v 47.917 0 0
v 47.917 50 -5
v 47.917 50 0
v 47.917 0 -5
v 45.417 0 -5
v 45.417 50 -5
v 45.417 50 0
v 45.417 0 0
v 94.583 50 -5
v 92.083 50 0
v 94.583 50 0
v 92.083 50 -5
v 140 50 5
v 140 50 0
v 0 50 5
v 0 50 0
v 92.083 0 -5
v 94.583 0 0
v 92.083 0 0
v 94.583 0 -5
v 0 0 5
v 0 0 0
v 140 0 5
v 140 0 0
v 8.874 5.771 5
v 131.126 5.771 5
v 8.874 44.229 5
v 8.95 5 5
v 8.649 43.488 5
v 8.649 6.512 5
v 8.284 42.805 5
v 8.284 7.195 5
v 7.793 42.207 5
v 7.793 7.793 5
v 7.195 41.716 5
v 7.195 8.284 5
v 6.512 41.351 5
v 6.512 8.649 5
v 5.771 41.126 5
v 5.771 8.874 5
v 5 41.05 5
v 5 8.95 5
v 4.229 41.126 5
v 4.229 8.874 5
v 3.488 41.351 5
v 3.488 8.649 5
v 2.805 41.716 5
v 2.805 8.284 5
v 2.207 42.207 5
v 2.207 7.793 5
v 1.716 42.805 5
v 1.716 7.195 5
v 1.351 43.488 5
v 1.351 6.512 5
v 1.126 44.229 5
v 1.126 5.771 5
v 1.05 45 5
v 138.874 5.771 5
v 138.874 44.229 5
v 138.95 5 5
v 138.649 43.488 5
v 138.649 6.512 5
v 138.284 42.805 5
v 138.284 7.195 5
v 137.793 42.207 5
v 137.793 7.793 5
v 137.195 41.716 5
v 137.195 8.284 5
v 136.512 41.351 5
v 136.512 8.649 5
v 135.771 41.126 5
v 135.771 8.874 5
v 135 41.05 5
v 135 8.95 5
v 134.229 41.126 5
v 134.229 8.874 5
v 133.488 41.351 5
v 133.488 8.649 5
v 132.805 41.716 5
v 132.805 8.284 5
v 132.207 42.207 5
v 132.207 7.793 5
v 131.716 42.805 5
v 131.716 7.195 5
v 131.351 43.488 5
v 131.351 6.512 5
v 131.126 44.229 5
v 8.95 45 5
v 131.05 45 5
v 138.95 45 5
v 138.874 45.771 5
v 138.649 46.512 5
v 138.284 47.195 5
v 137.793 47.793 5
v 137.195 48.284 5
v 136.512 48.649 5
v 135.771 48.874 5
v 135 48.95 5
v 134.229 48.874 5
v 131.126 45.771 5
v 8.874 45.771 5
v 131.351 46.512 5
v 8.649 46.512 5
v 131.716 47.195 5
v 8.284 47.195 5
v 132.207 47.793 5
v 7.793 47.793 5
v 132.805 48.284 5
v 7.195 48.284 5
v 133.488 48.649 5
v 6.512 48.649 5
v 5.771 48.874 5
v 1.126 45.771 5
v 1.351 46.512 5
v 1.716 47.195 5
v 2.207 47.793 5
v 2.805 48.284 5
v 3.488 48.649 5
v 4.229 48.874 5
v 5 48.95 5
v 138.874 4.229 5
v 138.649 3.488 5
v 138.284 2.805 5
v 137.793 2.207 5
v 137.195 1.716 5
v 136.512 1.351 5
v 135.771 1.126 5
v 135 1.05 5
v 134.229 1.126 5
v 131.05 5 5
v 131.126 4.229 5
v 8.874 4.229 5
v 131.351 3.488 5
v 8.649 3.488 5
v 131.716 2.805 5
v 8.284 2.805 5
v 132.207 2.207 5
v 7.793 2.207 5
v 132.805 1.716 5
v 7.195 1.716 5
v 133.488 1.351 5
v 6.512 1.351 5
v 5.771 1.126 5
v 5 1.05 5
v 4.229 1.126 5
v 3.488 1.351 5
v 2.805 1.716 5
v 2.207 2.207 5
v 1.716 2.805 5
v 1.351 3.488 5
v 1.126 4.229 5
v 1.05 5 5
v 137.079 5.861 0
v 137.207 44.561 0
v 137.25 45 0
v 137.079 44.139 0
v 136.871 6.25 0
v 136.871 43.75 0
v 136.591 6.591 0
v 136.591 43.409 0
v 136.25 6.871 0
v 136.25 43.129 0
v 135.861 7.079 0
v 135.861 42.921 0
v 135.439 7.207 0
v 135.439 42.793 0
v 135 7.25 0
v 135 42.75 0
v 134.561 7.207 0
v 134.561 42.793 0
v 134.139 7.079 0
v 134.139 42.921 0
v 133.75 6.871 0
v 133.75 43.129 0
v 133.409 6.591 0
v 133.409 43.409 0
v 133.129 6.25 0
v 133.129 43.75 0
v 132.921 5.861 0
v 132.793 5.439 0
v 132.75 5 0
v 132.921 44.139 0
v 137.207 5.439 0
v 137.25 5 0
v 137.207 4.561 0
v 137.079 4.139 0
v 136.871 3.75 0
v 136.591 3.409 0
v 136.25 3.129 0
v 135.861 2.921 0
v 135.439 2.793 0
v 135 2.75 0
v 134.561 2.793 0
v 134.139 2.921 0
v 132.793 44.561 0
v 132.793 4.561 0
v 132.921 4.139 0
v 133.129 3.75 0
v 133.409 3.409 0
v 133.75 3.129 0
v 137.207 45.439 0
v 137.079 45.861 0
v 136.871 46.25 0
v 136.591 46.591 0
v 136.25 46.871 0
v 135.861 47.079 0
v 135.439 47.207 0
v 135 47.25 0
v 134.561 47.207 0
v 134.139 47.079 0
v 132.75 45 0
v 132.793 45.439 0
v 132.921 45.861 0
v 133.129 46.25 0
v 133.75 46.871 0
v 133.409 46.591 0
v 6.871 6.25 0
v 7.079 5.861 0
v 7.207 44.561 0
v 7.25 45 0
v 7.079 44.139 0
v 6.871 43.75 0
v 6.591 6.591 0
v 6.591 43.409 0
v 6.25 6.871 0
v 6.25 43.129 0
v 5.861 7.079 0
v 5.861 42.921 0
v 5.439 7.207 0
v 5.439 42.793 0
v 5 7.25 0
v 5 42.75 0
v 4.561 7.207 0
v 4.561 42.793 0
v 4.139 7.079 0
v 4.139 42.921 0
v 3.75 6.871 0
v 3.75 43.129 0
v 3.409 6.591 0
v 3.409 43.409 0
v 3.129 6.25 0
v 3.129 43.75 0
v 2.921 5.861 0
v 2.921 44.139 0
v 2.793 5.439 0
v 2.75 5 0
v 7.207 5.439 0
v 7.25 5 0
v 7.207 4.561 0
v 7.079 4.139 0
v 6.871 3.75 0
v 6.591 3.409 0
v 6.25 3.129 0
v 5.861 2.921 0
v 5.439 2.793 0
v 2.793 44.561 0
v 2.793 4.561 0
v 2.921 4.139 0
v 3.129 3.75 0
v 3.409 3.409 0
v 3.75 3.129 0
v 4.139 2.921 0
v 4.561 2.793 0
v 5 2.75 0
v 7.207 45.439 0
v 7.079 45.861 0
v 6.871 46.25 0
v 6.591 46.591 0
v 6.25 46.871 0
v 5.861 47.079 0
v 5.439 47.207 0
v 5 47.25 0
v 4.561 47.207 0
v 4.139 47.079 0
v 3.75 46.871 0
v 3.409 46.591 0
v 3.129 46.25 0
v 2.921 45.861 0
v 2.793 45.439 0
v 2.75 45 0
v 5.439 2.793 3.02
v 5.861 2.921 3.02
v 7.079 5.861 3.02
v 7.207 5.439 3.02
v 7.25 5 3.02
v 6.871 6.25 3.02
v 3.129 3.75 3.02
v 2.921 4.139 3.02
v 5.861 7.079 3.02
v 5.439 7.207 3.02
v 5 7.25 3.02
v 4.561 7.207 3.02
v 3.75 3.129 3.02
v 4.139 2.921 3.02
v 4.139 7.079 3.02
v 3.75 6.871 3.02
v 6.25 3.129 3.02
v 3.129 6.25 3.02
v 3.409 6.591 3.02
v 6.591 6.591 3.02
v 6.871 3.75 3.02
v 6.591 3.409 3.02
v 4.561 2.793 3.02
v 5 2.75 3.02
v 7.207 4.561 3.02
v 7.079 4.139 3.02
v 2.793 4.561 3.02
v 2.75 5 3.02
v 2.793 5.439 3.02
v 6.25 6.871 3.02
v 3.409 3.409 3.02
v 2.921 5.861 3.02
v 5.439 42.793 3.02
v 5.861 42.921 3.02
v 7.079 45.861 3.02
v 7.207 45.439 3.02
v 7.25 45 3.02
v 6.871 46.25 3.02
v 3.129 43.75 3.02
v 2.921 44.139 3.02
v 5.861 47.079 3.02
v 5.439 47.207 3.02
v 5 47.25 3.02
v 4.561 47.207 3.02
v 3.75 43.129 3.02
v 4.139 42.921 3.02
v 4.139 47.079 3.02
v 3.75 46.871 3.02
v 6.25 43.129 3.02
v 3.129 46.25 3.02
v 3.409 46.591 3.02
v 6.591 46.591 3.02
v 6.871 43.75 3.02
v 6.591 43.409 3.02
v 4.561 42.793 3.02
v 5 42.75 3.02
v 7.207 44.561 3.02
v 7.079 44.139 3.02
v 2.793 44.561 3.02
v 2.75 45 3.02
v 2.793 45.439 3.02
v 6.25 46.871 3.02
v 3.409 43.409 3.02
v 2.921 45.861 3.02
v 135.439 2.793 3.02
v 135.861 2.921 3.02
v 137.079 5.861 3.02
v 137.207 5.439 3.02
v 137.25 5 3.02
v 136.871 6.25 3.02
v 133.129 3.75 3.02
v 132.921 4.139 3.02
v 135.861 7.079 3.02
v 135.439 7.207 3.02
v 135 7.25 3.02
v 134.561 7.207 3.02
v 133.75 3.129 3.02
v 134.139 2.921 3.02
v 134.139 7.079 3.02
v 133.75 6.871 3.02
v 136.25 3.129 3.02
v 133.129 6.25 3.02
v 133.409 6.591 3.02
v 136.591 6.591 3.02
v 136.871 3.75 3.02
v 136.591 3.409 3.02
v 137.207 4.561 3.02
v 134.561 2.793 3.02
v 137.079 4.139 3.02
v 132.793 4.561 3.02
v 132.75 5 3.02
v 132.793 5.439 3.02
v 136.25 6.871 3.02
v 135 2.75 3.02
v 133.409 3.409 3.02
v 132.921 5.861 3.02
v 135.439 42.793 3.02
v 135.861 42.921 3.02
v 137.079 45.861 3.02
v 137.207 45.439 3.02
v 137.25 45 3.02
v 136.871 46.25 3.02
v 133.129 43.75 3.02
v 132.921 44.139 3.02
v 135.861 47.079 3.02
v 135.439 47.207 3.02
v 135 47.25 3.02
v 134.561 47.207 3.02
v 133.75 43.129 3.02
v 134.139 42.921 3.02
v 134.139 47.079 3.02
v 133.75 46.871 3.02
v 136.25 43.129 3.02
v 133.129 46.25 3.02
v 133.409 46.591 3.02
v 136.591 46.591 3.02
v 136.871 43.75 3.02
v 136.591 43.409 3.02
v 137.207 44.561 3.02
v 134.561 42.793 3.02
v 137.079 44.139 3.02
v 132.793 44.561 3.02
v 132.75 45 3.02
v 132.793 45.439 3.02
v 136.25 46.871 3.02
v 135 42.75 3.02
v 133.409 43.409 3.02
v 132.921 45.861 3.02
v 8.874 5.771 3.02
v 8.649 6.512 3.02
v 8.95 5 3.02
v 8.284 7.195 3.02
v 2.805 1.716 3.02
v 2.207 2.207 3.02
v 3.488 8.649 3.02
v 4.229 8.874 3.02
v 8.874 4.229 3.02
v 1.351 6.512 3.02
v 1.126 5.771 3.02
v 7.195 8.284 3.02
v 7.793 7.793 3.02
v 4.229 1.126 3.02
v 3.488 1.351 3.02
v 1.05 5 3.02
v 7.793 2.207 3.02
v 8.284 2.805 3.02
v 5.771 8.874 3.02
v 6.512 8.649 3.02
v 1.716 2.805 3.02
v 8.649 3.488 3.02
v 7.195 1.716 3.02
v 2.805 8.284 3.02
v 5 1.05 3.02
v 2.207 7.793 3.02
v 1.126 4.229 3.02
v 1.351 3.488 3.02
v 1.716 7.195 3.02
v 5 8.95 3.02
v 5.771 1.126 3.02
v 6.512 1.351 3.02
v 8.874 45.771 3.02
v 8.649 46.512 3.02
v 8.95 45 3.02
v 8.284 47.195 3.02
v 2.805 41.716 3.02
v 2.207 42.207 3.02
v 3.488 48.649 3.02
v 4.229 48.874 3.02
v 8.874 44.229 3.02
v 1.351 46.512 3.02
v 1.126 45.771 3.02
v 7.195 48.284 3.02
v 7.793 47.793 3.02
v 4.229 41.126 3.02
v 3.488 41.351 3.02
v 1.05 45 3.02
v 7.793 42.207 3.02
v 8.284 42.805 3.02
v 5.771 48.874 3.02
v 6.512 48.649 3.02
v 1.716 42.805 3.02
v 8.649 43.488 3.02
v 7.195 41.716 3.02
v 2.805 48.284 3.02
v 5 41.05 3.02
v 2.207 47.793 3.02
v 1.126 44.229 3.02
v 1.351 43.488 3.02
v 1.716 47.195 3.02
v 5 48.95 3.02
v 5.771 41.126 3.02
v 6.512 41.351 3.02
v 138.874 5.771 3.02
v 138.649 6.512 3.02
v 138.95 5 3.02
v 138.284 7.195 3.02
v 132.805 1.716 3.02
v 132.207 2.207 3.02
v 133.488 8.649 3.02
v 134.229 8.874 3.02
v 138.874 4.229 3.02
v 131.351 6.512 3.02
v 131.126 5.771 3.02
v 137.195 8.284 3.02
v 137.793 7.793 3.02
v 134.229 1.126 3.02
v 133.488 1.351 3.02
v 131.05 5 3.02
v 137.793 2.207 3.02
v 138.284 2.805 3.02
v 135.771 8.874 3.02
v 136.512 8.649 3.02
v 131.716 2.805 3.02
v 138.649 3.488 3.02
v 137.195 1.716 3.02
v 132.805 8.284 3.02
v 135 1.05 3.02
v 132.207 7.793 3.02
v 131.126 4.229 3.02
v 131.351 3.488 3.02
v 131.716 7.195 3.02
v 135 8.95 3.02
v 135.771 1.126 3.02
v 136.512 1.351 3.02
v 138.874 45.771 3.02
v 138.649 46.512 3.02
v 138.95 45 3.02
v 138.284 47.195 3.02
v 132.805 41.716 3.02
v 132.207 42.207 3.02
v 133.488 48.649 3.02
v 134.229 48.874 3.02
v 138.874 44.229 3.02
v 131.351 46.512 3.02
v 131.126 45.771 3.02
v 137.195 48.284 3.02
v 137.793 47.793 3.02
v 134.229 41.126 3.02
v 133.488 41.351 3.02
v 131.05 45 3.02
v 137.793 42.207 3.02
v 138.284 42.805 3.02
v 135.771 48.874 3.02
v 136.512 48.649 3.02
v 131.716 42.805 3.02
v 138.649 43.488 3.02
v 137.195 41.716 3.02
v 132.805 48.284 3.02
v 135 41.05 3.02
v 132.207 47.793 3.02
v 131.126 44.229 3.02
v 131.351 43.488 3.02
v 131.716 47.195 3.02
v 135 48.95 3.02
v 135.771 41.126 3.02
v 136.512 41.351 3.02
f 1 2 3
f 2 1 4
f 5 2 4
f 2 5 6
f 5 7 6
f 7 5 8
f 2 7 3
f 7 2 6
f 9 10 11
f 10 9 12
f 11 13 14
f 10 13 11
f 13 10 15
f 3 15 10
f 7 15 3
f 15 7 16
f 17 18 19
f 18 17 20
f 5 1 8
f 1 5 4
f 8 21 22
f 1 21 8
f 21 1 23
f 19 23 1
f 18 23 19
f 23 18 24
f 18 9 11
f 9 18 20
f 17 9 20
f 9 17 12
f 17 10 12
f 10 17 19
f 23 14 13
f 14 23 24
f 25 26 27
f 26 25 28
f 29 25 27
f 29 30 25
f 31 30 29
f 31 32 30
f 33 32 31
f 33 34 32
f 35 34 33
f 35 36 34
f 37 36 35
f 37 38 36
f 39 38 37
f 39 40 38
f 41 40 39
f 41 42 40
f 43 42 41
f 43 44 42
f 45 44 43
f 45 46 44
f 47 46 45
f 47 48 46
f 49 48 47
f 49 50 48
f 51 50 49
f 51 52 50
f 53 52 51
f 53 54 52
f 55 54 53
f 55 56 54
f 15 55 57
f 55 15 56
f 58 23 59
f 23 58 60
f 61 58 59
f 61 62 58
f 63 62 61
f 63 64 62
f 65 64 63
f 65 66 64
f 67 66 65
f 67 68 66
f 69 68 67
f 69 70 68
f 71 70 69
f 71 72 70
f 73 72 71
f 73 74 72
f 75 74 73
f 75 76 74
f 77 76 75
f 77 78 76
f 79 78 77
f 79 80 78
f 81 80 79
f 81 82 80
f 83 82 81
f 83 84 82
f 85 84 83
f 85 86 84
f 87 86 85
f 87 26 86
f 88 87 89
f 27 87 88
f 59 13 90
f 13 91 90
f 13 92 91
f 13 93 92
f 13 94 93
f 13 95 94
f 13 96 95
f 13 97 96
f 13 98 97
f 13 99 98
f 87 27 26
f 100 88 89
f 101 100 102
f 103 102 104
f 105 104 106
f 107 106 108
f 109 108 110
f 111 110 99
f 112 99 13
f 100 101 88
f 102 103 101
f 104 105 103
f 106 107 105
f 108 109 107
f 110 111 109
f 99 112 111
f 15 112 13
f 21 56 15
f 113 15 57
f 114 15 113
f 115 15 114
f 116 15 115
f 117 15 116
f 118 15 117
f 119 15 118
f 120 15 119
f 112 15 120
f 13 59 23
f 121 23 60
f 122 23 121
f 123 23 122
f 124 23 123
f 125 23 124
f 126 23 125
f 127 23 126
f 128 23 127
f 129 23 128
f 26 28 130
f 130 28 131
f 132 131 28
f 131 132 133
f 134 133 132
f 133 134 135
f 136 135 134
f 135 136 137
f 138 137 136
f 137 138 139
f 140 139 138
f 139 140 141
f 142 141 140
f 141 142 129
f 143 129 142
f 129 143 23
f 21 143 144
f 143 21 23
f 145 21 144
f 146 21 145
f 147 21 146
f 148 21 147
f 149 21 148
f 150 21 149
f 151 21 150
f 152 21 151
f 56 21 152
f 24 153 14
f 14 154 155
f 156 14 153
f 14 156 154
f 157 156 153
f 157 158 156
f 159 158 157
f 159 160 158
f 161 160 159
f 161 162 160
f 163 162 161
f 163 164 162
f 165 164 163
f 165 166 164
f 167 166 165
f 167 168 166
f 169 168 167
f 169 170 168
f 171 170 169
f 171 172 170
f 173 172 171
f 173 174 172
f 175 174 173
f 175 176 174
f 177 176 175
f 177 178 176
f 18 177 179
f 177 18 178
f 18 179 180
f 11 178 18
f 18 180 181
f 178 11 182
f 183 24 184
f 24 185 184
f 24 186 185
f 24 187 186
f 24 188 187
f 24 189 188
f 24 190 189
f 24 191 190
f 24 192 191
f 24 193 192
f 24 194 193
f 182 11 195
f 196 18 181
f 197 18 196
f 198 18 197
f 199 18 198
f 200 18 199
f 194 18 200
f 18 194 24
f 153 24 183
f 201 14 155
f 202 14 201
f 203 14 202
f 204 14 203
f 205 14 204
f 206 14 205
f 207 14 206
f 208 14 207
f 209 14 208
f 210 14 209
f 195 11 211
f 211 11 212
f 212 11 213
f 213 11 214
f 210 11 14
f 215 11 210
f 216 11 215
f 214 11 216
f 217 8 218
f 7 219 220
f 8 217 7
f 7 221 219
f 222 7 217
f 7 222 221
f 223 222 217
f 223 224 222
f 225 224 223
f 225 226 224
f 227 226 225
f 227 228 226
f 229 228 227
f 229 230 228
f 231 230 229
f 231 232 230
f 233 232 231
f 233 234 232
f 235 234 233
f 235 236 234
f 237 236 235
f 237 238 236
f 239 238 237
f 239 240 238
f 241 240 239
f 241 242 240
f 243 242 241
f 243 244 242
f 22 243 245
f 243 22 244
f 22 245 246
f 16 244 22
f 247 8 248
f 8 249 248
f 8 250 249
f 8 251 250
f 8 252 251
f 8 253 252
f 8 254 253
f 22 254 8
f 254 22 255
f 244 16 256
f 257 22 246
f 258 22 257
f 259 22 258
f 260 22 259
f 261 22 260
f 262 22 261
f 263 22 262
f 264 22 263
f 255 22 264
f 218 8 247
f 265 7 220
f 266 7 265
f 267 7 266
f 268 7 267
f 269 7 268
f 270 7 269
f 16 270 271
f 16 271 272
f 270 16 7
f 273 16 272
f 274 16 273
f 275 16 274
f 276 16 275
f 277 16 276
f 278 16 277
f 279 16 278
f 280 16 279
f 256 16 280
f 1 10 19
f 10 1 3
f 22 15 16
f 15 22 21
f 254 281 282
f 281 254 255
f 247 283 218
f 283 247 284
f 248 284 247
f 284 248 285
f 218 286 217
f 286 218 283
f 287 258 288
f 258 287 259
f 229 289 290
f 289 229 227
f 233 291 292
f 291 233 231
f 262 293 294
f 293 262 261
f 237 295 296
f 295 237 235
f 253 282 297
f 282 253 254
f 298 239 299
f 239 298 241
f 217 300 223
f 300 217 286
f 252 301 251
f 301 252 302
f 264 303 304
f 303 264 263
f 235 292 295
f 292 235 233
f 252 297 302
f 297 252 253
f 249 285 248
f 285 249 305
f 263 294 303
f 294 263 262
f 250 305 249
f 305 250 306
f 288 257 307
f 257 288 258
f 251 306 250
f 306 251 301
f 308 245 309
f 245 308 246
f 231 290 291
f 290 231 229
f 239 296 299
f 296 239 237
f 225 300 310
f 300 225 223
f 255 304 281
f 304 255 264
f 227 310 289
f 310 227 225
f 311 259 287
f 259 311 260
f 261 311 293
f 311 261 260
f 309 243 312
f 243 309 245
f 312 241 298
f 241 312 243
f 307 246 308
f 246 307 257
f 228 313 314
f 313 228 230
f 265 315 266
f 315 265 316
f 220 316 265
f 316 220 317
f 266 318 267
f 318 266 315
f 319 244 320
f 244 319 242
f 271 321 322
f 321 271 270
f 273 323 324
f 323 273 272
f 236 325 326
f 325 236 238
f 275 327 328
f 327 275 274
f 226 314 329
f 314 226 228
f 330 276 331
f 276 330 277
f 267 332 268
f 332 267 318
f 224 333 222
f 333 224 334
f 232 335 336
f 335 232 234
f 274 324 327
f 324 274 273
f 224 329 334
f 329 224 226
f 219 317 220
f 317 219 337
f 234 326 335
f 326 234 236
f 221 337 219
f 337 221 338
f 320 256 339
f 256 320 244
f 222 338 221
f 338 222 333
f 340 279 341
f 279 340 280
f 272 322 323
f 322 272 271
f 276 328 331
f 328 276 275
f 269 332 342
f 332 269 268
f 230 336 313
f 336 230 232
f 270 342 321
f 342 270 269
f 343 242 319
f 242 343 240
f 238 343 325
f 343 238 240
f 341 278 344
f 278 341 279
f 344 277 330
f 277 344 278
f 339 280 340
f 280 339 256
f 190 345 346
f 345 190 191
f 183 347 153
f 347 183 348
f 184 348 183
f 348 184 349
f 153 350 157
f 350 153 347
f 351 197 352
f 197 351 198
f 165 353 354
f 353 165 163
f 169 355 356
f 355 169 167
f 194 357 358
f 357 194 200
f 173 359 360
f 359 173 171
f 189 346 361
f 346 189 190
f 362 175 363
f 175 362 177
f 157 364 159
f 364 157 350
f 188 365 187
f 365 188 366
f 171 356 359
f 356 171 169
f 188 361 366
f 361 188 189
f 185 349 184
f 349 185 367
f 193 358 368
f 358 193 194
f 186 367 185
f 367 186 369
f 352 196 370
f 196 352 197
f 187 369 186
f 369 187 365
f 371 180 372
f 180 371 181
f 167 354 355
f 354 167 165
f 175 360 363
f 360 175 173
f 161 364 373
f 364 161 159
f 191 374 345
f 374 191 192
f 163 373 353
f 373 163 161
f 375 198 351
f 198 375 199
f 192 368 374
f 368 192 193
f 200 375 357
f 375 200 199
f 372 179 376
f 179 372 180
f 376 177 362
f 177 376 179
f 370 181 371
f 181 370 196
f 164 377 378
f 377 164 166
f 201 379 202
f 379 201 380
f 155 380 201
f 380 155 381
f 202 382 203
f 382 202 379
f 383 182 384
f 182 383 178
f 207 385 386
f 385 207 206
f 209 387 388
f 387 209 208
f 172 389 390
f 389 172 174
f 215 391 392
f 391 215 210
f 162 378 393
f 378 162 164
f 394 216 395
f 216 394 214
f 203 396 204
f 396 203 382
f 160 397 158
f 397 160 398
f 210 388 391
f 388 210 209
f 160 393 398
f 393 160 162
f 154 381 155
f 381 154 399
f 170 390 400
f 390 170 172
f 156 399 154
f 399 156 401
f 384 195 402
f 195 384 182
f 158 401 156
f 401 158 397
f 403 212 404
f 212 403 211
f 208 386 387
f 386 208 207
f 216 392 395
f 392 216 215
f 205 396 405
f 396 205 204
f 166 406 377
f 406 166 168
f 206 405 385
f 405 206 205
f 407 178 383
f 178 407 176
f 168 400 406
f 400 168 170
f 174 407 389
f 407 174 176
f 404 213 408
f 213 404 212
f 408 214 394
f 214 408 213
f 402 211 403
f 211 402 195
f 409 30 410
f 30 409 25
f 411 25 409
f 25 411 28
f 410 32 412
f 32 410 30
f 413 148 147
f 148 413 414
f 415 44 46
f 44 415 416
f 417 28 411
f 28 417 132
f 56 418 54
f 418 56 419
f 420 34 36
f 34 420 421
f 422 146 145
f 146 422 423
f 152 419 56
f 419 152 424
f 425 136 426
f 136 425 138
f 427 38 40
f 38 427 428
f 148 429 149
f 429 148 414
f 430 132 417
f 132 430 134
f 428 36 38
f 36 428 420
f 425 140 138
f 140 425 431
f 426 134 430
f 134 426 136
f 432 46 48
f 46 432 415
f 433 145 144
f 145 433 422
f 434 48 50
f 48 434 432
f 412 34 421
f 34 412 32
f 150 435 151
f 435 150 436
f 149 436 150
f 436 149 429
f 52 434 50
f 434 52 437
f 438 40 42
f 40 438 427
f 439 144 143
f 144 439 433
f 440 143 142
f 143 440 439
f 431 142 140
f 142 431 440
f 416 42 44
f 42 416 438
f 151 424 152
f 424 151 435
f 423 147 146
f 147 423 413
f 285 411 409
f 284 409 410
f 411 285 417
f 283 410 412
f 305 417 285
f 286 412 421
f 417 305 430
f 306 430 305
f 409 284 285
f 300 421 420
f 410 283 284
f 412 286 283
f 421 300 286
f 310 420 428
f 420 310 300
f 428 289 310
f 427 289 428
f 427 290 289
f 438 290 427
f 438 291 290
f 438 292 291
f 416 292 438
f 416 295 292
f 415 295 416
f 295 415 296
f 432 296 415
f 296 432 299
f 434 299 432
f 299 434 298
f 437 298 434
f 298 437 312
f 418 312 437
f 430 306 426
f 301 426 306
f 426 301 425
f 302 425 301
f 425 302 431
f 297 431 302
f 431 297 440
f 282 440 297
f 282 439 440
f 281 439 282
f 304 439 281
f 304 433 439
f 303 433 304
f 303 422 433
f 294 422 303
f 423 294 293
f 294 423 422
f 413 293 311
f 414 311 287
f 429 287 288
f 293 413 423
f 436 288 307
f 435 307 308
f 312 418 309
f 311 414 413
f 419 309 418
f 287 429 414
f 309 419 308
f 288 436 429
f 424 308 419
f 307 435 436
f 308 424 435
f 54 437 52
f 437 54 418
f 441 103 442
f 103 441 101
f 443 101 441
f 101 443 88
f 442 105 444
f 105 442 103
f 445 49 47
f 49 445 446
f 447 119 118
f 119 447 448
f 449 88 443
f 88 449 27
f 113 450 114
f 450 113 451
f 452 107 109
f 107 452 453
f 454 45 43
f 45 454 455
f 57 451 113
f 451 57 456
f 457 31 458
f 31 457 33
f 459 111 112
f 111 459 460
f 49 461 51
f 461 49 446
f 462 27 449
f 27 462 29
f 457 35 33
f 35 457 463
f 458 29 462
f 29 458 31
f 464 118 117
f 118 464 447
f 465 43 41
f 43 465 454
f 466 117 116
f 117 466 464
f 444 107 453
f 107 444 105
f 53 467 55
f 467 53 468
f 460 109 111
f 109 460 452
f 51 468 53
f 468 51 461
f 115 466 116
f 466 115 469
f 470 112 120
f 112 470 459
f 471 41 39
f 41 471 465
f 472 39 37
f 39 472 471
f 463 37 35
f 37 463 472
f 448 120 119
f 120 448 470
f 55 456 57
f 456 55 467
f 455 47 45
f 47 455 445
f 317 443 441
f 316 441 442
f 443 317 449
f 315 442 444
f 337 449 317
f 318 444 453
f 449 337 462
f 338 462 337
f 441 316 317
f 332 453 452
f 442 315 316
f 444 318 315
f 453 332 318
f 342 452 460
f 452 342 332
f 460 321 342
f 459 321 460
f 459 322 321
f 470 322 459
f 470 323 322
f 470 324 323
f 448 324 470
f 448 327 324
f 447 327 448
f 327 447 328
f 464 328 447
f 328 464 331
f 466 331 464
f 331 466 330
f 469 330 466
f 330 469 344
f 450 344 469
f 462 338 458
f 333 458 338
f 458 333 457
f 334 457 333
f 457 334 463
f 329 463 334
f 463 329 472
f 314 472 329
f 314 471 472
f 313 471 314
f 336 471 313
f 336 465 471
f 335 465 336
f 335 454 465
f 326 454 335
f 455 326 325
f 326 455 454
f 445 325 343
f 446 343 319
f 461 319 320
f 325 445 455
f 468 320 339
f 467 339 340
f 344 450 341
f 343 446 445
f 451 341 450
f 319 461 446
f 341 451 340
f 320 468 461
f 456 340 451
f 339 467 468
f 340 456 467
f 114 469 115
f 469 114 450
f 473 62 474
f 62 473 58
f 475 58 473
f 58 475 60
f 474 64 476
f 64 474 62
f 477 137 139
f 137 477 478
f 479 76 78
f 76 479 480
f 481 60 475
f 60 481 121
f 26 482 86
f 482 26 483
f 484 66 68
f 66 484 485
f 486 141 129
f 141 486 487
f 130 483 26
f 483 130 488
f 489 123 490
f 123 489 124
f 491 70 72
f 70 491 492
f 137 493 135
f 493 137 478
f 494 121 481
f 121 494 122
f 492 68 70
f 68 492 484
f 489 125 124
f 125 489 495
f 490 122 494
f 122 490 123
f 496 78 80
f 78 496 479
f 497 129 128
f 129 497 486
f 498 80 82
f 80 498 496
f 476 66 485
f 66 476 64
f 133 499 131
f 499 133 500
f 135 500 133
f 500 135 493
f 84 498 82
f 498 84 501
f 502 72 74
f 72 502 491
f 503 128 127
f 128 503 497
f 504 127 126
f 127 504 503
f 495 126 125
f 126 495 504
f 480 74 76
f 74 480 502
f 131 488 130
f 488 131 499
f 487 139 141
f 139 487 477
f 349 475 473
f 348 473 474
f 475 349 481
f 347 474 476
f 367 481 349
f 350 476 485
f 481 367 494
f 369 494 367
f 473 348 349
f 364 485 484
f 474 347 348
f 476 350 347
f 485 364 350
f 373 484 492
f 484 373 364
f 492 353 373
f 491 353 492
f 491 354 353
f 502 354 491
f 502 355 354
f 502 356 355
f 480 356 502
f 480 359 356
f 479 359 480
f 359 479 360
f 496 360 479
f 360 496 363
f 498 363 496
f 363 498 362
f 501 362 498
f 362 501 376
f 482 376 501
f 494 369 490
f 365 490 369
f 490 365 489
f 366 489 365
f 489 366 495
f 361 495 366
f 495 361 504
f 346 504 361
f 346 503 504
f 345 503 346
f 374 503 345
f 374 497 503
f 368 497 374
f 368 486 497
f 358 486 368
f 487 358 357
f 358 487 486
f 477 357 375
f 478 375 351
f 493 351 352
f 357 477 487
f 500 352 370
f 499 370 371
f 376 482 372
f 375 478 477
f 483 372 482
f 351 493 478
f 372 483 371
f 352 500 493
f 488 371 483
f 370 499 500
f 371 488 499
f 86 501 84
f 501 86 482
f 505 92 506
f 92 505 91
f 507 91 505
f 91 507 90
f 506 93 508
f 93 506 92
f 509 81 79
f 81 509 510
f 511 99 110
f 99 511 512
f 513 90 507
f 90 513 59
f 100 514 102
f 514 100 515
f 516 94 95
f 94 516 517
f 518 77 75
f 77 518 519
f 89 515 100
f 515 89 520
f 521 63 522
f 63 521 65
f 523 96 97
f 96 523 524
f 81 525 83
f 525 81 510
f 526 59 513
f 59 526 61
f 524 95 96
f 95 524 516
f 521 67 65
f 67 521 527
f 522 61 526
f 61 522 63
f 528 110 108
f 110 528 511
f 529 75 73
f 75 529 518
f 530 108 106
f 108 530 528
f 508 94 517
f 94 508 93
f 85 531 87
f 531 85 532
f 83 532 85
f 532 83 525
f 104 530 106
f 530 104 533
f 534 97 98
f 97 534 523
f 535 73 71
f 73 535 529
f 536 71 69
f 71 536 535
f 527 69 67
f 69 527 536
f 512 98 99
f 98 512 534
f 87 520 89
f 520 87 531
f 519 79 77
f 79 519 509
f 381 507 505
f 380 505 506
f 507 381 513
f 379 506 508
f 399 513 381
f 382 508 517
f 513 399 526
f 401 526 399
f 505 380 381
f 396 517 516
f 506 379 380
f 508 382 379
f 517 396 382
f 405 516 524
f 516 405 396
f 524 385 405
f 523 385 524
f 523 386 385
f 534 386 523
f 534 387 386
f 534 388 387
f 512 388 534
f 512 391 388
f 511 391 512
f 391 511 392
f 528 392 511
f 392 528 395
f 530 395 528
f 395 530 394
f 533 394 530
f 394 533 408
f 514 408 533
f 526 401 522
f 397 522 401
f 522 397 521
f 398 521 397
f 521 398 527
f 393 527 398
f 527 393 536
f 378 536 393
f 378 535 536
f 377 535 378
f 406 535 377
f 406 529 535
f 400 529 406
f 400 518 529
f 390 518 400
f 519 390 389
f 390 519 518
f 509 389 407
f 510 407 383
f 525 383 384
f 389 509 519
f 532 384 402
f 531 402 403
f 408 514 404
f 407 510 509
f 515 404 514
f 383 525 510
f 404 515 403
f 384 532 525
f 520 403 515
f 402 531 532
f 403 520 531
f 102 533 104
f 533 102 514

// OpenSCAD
$fn = 32;

// ----------------------------------------------------------------------
// Enclosure lid: 140 x 50 x 5 mm, 4 bolt holes
// ----------------------------------------------------------------------

// --- parameters (mm) ---
length = 140;             // lid length, X
width = 50;               // lid width, Y
plate_t = 5;              // lid plate thickness
bolt_d = 4.5;             // bolt clearance
boss_lip = 5;             // bolt hole inset from the corner
sink = 1;                 // overlap of the lip and ribs into the plate
cs_d = 7.9;               // countersink diameter
cs_h = 1.98;              // countersink depth
rib_n = 2;                // stiffening ribs
rib_t = 2.5;              // rib thickness
rib_h = 6;                // rib height below the plate

module plate() {
  cube([length, width, plate_t]);
  /* stiffening ribs under the plate */
  for (i = [1 : rib_n]) translate([length * i / (rib_n + 1) - rib_t / 2, 0, -rib_h + sink]) cube([rib_t, width - 2 * 0, rib_h]);
}

difference() {
  plate();
  /* bolt pattern matching the corner bosses */
  for (sx = [0, 1]) for (sy = [0, 1])
    translate([sx * (length - 2 * boss_lip) + boss_lip, sy * (width - 2 * boss_lip) + boss_lip, -0 - 1])
      cylinder(h = plate_t + 0 + 2, d = bolt_d);
  /* countersinks so the heads sit flush */
  for (sx = [0, 1]) for (sy = [0, 1])
    translate([sx * (length - 2 * boss_lip) + boss_lip, sy * (width - 2 * boss_lip) + boss_lip, plate_t - cs_h])
      cylinder(h = cs_h + 0.5, d = cs_d);
}
